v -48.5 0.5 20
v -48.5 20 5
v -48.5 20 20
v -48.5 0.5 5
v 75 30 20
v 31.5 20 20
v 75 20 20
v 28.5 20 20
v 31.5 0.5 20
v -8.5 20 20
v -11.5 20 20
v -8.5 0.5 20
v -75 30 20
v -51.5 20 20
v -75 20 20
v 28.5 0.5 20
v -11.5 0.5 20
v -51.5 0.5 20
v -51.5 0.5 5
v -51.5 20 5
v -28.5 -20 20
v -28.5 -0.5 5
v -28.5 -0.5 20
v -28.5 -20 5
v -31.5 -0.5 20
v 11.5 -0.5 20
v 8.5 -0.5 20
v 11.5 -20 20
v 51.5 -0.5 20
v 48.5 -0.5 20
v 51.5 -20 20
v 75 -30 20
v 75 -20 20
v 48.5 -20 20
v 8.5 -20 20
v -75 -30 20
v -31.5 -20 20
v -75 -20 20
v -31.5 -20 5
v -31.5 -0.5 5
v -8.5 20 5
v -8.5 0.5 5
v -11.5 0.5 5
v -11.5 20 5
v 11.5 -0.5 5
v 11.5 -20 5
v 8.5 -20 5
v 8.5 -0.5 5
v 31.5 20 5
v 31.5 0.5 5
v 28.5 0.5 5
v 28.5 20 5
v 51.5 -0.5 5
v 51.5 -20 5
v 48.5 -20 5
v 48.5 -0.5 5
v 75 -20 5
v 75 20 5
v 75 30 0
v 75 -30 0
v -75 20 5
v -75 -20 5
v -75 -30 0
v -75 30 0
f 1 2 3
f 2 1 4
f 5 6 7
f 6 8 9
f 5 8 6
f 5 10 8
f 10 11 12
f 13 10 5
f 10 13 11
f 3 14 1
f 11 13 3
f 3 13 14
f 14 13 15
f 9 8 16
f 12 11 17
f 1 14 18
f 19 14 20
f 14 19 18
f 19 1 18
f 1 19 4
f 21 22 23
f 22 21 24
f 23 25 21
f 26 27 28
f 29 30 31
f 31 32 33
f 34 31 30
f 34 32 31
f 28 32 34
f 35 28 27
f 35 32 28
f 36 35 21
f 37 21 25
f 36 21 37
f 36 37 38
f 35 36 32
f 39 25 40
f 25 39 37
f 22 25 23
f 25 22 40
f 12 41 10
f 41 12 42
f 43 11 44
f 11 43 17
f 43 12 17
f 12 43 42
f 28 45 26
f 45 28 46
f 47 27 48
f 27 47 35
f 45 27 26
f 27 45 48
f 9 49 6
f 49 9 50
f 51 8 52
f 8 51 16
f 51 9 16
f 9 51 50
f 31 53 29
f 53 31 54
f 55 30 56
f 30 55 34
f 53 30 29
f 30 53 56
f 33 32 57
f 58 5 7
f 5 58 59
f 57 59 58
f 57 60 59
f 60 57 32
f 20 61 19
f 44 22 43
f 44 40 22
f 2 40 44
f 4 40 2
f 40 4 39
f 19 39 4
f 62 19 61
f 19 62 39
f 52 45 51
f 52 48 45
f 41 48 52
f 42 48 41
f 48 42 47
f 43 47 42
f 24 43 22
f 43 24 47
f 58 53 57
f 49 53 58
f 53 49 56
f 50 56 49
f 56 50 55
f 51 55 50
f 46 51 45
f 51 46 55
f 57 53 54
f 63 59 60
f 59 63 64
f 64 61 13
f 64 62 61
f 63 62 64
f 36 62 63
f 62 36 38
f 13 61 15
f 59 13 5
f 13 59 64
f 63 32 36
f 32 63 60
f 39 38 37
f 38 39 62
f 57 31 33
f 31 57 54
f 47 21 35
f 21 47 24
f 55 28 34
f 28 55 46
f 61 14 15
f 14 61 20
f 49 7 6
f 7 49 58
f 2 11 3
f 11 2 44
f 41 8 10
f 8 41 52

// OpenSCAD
$fn = 32;

// ----------------------------------------------------------------------
// Rib frame 150 x 60 x 20
// 6 ribs at 20 mm pitch, staggered
// ----------------------------------------------------------------------

// --- parameters (mm) ---
frame = [150, 60, 5];  // base plate size (x, y, z)
rail_w = 10;           // side rail width
ribs = 6;              // number of ribs
rib_t = 3;             // rib thickness
rib_h = 15;            // rib height above the base plate
pitch = 20;            // pitch between rib centres

// --- derived feature positions (mm) ---
span = (ribs - 1) * pitch;          // = 100   distance between the outer ribs
origin_x = -span / 2;               // = -50   X of the first rib
rib_len = frame[1] / 2 - rail_w + 0.5;  // = 20.5   length of a staggered rib
rib_y = 0.5 + rib_len / 2;          // = 10.75   Y of a staggered rib centre
row_offset = 2 * rib_y;             // = 21.5   distance between the two rows
feature_centers = [
  [origin_x + 0 * pitch, rib_y],
  [origin_x + 1 * pitch, -rib_y],
  [origin_x + 2 * pitch, rib_y],
  [origin_x + 3 * pitch, -rib_y],
  [origin_x + 4 * pitch, rib_y],
  [origin_x + 5 * pitch, -rib_y]
];   // rib centre line, drives the rib loop

// base plate, two side rails, then the ribs read straight off feature_centers
union() {
  translate([-frame[0] / 2, -frame[1] / 2, 0]) cube(frame);
  translate([-frame[0] / 2, -frame[1] / 2, 0]) cube([frame[0], rail_w, frame[2] + rib_h]);
  translate([-frame[0] / 2, frame[1] / 2 - rail_w, 0]) cube([frame[0], rail_w, frame[2] + rib_h]);
  for (centre = feature_centers)
    translate([centre[0] - rib_t / 2, centre[1] - rib_len / 2, frame[2] - 1])
      cube([rib_t, rib_len, rib_h + 1]);
}
